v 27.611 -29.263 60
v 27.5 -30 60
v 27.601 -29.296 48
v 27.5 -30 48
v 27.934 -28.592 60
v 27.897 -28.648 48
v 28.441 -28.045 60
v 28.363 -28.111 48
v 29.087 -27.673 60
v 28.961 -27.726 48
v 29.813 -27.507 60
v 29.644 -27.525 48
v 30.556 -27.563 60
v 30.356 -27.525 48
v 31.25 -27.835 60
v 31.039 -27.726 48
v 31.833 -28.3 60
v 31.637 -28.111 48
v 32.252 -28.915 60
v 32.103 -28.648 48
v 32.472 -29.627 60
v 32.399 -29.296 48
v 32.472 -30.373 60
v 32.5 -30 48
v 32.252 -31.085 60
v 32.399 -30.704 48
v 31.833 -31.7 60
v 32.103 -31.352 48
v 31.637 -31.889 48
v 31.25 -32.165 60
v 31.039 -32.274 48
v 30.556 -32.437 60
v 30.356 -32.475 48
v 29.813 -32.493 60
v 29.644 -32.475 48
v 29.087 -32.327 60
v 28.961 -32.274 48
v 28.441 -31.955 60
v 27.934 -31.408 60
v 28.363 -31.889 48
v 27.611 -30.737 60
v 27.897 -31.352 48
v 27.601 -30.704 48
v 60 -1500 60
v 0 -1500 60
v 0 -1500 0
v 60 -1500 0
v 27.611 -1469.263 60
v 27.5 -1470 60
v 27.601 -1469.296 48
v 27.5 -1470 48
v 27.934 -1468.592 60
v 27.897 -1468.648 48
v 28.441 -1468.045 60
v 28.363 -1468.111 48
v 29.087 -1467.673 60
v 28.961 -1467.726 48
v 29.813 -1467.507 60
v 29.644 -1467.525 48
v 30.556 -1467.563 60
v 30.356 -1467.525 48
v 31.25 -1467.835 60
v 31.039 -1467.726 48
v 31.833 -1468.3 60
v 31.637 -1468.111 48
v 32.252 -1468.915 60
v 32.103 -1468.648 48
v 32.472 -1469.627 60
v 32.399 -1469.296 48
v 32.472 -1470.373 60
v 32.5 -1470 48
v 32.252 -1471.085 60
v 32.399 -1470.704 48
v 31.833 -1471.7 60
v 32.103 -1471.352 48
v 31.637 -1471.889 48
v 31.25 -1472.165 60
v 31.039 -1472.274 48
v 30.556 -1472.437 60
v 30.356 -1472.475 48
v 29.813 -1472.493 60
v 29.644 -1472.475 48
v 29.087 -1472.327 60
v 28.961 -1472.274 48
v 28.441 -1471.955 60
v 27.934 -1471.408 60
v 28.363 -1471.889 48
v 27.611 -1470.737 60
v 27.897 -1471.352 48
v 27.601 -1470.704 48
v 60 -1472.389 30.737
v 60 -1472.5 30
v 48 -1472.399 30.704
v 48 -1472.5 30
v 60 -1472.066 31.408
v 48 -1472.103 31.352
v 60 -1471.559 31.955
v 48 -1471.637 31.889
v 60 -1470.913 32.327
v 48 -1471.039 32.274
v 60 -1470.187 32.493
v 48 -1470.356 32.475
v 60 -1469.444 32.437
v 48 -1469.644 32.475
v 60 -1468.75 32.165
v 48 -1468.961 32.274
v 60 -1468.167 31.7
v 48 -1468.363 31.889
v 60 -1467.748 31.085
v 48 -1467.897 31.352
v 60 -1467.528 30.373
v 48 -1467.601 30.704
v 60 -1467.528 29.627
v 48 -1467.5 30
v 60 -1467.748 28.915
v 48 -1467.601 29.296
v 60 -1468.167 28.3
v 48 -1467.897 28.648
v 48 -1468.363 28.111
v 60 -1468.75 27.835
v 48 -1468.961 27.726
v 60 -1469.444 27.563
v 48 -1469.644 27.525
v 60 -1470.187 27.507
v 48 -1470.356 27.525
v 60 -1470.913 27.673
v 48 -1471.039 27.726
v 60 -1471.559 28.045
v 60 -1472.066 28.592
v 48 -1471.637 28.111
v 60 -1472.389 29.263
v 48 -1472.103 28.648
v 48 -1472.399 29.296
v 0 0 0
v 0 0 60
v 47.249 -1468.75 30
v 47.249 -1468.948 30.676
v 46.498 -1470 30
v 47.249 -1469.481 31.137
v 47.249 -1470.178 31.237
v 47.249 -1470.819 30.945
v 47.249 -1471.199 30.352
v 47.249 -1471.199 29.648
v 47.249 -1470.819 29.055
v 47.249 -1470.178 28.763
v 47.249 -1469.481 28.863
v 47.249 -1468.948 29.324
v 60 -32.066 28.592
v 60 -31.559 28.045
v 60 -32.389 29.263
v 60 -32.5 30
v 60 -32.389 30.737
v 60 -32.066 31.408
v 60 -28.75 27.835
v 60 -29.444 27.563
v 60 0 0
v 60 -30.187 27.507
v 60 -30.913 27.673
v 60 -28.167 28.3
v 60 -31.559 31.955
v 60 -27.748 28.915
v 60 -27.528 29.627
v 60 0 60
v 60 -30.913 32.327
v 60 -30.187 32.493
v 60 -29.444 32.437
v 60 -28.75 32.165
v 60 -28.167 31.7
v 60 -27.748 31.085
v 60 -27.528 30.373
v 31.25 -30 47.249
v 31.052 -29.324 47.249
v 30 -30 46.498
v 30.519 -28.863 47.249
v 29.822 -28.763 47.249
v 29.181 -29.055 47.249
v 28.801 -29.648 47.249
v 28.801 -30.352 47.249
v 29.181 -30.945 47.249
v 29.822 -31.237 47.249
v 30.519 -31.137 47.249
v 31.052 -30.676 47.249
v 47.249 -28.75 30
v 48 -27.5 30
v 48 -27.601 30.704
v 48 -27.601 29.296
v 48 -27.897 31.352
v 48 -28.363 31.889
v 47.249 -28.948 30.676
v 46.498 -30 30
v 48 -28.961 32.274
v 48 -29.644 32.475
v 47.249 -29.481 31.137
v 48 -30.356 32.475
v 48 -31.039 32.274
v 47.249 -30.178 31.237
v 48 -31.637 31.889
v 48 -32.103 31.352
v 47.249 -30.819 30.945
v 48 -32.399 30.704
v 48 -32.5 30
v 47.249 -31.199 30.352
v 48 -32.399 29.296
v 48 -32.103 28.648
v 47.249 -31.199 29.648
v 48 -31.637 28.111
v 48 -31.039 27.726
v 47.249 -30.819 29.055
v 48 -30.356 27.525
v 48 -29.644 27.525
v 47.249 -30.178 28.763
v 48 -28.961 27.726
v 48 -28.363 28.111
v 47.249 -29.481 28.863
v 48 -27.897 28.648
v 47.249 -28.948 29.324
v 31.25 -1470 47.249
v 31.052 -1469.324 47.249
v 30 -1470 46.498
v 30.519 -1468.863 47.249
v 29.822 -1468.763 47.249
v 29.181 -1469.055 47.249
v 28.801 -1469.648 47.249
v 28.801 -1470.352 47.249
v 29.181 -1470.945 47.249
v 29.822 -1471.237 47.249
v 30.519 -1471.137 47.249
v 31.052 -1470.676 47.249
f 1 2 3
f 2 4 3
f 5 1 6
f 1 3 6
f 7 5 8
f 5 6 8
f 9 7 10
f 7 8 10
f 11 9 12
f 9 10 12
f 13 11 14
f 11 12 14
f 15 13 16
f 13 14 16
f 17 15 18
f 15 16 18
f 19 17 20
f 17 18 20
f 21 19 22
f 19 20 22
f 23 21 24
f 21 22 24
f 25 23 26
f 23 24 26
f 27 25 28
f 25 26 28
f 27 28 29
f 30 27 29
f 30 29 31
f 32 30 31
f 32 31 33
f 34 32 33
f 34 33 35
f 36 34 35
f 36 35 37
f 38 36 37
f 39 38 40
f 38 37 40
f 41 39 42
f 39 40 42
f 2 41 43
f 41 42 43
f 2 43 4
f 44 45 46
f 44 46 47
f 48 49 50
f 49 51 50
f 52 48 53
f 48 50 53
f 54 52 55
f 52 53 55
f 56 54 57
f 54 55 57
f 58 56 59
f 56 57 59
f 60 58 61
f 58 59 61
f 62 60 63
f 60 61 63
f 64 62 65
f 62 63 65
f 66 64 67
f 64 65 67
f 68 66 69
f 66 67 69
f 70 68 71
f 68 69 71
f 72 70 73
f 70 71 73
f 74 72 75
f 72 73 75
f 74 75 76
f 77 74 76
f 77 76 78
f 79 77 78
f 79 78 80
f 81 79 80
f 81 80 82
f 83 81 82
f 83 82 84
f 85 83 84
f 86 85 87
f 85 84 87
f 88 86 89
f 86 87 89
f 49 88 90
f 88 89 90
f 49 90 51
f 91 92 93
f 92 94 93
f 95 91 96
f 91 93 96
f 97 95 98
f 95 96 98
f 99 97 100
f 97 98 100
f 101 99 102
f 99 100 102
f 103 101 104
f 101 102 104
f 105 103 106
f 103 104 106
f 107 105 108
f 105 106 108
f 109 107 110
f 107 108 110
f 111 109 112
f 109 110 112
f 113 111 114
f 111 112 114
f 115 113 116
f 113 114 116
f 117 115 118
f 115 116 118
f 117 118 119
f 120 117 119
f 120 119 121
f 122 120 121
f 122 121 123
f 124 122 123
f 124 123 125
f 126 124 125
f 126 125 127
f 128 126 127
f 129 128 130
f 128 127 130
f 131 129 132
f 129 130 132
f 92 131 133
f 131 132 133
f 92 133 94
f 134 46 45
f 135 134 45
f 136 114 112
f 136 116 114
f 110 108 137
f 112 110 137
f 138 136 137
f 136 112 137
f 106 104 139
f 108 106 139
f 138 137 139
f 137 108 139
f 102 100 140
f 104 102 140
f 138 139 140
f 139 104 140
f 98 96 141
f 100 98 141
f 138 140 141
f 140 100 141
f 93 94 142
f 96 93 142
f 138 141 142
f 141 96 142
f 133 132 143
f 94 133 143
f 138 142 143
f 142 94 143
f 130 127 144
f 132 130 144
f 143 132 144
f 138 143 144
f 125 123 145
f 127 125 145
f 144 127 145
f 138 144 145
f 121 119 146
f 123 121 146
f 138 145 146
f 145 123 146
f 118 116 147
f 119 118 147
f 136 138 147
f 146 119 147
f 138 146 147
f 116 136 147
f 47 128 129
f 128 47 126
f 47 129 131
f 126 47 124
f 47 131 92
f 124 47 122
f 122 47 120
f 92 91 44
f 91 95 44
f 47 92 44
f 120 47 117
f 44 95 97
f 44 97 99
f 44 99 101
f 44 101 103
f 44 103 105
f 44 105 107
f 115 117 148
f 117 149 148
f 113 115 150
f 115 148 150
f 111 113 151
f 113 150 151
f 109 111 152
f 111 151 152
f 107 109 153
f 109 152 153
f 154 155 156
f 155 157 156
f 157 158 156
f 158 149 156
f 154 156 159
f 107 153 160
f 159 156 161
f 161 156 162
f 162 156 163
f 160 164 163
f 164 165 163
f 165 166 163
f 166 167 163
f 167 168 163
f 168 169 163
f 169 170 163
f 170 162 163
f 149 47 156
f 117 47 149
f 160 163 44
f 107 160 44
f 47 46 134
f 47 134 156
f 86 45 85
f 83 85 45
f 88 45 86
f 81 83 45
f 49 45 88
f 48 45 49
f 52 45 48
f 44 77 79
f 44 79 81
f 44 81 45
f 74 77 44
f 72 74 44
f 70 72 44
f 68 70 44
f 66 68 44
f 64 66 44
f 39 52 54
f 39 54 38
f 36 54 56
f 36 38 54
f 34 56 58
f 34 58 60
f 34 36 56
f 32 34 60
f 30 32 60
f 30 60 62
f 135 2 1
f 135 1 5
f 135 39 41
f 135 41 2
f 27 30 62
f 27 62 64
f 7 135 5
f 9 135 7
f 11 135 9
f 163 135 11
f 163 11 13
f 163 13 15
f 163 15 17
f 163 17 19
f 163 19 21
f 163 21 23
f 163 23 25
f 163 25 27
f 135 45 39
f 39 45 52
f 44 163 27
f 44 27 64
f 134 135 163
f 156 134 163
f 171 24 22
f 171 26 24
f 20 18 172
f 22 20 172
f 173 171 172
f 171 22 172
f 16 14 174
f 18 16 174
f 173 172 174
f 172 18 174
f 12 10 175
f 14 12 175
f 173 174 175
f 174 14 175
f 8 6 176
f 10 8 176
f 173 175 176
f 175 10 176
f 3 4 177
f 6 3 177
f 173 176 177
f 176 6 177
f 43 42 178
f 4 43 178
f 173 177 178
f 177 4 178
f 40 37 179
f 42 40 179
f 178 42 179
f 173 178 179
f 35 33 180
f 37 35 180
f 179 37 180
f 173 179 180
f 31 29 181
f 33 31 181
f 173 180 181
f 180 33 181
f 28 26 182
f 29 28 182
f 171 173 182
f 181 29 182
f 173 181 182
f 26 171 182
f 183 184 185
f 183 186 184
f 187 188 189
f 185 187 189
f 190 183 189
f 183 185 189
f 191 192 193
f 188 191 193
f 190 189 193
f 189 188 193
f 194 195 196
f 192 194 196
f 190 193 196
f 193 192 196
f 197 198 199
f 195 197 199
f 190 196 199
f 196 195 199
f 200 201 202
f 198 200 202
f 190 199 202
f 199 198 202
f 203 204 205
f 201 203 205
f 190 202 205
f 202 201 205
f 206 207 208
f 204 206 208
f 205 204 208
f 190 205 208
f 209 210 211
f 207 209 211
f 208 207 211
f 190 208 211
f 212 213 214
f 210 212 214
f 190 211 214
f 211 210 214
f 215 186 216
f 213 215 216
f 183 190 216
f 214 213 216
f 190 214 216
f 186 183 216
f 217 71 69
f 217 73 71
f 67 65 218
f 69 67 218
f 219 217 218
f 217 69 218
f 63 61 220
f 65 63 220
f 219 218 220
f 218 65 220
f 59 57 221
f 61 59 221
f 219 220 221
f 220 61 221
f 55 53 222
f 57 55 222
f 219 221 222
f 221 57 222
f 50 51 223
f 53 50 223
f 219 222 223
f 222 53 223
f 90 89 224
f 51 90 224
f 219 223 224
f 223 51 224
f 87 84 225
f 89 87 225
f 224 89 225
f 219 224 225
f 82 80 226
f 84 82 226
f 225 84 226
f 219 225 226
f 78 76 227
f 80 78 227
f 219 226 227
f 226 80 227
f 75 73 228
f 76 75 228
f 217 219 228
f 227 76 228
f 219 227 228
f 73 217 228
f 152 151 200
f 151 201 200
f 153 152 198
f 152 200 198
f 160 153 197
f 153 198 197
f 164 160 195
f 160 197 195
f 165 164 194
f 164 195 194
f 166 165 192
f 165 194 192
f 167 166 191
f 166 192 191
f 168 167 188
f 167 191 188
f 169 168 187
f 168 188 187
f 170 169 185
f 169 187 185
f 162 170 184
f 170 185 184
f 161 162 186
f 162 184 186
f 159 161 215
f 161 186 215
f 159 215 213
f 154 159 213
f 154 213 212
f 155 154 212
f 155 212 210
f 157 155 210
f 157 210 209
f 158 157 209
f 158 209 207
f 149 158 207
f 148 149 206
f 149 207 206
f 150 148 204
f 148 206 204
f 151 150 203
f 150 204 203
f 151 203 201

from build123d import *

# Parameters (mm, degrees)
F3_W     = 60
F3_H     = 60
F4_DEPTH = 1500
F7_D     = 5
F7_DEPTH = 12
F7_TIP   = 1.5021515476
F8_D     = 5
F8_DEPTH = 12
F8_TIP   = 1.5021515476


with BuildPart() as f4:
    # F3 (on Front) → F4 (new body)
    with BuildSketch(Plane.XZ):
        with Locations((30, 30)):
            Rectangle(F3_W, F3_H)
    extrude(amount=F4_DEPTH)

    # F7
    with Locations(Plane.XY.offset(60)):
        with Locations((30, -1470), (30, -30)):
            Hole(F7_D / 2, depth=F7_DEPTH)
            with Locations((0, 0, -(F7_DEPTH + F7_TIP / 2))):  # 118° drill point
                Cone(0, F7_D / 2, F7_TIP, mode=Mode.SUBTRACT)

    # F8
    with Locations(Plane.YZ.offset(60)):
        with Locations((-30, 30), (-1470, 30)):
            Hole(F8_D / 2, depth=F8_DEPTH)
            with Locations((0, 0, -(F8_DEPTH + F8_TIP / 2))):  # 118° drill point
                Cone(0, F8_D / 2, F8_TIP, mode=Mode.SUBTRACT)


solid = f4.part
